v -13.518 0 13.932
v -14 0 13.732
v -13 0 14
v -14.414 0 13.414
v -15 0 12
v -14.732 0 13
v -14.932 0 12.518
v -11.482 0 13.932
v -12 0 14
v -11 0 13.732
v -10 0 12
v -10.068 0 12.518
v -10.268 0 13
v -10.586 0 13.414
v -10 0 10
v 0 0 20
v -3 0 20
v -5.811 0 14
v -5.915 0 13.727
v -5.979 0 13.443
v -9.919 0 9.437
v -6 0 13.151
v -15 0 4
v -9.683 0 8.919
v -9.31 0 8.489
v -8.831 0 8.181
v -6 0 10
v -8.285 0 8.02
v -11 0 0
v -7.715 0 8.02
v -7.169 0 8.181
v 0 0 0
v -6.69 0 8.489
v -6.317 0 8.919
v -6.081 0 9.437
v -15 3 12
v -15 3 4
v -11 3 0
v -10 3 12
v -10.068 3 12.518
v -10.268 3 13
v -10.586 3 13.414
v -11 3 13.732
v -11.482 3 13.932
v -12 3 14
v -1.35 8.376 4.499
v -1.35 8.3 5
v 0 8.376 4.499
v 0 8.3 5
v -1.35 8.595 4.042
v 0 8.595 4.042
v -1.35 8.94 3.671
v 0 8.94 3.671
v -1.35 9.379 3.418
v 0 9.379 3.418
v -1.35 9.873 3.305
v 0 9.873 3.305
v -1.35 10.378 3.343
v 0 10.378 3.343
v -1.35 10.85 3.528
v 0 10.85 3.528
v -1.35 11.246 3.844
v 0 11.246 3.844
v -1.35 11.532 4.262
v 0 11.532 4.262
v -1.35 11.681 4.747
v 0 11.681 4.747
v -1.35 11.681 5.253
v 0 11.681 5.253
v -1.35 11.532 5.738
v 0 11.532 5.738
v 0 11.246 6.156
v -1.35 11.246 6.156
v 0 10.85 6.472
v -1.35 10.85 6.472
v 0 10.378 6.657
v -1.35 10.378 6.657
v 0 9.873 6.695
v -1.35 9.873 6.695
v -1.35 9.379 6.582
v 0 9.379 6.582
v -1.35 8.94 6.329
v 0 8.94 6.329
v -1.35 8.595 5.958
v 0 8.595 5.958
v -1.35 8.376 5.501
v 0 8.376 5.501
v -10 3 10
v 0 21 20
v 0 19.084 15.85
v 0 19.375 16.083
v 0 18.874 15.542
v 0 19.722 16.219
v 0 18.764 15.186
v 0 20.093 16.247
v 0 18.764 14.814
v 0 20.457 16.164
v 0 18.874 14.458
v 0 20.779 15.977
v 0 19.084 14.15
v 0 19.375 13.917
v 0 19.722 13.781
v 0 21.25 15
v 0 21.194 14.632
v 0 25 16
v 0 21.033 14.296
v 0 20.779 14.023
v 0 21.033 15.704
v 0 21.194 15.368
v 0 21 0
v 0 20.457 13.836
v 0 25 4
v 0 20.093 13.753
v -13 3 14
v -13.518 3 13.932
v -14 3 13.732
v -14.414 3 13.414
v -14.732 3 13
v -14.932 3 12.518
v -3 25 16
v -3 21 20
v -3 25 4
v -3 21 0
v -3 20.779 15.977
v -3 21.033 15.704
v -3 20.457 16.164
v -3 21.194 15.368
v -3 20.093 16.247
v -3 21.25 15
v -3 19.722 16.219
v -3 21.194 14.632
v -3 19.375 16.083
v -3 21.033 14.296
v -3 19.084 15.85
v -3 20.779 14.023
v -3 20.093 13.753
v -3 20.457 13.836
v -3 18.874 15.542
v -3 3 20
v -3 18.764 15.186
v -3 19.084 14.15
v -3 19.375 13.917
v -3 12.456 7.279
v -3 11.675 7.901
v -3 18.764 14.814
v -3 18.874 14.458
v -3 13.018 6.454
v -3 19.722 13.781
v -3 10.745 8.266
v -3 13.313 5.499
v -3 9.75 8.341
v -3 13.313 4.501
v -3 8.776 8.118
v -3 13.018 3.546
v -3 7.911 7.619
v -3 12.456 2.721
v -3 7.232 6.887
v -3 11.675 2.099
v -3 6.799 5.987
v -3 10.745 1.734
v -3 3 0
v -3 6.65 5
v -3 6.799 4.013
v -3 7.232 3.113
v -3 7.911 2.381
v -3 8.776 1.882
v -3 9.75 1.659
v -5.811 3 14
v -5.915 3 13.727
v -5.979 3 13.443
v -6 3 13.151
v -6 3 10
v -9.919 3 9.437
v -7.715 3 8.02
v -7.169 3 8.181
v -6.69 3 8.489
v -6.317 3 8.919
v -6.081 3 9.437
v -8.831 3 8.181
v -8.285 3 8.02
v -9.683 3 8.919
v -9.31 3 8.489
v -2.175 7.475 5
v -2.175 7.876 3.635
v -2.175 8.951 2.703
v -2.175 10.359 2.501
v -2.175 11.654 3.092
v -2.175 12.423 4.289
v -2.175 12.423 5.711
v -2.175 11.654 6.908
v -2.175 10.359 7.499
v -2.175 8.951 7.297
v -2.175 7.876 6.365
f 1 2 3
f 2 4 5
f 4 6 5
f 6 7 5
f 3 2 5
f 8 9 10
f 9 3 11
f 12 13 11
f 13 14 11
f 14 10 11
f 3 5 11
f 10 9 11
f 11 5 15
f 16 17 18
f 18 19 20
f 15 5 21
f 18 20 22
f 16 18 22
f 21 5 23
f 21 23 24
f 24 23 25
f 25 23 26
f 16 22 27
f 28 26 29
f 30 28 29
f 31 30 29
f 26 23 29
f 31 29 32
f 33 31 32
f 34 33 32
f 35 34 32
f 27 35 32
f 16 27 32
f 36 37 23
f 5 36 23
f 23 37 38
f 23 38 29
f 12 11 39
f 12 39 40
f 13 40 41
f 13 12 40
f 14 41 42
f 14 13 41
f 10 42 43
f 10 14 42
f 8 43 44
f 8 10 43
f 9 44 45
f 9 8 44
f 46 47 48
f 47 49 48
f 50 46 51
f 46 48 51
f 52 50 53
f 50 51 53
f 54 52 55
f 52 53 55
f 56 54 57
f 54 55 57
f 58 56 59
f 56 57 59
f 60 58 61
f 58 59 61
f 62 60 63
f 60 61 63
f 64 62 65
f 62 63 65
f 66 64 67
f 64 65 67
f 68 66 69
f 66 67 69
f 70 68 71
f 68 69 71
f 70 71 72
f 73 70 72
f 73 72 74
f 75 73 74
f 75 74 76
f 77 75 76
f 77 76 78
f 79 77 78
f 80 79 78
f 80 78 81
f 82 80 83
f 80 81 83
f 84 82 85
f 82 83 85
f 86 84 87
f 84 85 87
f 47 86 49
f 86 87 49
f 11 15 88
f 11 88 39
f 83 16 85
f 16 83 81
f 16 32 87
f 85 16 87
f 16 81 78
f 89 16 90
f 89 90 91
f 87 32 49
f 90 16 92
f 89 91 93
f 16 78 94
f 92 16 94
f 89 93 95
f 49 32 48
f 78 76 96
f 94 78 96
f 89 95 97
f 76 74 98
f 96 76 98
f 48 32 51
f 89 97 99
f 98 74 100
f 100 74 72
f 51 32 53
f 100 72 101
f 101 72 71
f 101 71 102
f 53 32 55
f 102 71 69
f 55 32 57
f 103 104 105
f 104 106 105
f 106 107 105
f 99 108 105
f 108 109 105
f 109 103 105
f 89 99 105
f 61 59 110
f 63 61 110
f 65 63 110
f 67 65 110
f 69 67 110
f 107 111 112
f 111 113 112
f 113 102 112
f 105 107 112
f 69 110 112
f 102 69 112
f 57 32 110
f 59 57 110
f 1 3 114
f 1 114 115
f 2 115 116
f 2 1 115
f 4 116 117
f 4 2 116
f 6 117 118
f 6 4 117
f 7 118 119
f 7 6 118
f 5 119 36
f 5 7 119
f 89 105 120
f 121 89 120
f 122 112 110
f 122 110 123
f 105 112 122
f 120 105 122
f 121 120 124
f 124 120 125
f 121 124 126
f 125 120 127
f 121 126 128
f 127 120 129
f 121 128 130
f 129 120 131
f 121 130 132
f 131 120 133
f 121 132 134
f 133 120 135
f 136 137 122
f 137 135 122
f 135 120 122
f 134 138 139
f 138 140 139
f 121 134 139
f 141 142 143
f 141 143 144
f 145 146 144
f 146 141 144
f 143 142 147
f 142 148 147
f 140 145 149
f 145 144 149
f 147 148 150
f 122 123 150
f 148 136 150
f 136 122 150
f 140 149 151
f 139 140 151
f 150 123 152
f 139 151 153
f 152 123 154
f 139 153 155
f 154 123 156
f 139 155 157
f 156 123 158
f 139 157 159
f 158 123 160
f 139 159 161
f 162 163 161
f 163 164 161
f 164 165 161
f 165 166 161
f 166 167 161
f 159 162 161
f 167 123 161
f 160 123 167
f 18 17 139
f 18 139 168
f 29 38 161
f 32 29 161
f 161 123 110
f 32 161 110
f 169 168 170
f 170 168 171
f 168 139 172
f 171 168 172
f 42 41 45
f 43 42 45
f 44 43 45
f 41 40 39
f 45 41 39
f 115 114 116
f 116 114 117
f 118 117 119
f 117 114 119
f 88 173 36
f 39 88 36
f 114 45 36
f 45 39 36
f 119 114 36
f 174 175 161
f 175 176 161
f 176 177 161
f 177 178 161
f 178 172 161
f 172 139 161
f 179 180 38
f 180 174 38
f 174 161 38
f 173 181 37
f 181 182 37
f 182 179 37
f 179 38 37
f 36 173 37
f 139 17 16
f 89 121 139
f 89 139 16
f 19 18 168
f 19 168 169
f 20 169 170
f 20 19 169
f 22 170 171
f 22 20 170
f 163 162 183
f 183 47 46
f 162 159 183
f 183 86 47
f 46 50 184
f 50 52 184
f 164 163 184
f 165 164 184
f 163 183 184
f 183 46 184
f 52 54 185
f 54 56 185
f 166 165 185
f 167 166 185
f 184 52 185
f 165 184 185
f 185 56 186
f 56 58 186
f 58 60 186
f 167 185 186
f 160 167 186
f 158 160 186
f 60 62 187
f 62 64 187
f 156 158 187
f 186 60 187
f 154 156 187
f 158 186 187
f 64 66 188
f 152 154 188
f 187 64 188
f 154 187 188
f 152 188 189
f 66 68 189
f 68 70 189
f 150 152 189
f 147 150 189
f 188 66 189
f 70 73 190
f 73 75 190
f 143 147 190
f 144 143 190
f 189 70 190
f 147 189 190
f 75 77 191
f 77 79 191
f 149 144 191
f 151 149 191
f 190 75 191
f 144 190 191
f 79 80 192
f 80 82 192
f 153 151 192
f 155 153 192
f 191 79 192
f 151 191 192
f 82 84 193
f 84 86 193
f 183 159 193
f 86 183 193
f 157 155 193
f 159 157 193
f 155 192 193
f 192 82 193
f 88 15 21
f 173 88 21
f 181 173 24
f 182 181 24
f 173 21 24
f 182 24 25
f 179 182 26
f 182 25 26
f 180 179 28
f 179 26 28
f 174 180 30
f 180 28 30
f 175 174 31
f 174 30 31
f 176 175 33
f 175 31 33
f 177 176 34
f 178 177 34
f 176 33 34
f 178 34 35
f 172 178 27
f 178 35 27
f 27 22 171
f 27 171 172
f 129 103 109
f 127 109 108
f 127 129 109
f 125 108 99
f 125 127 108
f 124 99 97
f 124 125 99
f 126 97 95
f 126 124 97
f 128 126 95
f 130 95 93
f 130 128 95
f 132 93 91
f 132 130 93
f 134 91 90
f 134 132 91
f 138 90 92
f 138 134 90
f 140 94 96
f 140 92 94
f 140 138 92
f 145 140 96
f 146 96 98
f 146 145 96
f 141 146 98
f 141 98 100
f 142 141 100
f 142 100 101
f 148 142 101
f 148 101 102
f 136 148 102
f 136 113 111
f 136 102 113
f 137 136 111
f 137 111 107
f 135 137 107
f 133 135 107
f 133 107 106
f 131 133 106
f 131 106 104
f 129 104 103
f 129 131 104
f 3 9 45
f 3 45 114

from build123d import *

# Parameters (mm, degrees)
PAD_DEPTH        = 20
POCKET_DEPTH     = 25.001
HOLE_D           = 3.4
HOLE_DEPTH       = 25
HOLE_CSINK_D     = 6.7
HOLE_CSINK_ANGLE = 90
SKETCH029_R      = 1.25
HOLE002_DEPTH    = 3.001
CHAMFER003_SIZE  = 4


with BuildPart() as part:
    # Sketch → Pad (new body)
    with BuildSketch(Plane.XY):
        Polygon((0, 0), (0, 25), (-3, 25), (-3, 3), (-15, 3), (-15, 0), align=None)
    extrude(amount=PAD_DEPTH)

    # Sketch027 → Pocket (cut, through all)
    with BuildSketch(Plane.XZ):
        with BuildLine():
            Line((-3, 20), (-5.811082, 14))
            ThreePointArc((-5.811082, 14), (-5.952199, 13.58613), (-6, 13.151483))
            Line((-6, 13.151483), (-6, 10))
            ThreePointArc((-10, 10), (-8, 8), (-6, 10))
            Line((-10, 10), (-10, 12))
            ThreePointArc((-10, 12), (-10.585786, 13.414214), (-12, 14))
            Line((-12, 14), (-13, 14))
            ThreePointArc((-13, 14), (-14.414214, 13.414214), (-15, 12))
            Line((-15, 12), (-15, 20))
            Line((-15, 20), (-3, 20))
        make_face()
    extrude(amount=-POCKET_DEPTH, mode=Mode.SUBTRACT)

    # Hole
    with Locations(Plane(origin=(-3, 0, 0), x_dir=(0, 1, 0), z_dir=(-1, 0, 0))):
        with Locations((10, -5)):
            CounterSinkHole(HOLE_D / 2, HOLE_CSINK_D / 2, depth=HOLE_DEPTH, counter_sink_angle=HOLE_CSINK_ANGLE)

    # Sketch029 → Hole002 (cut, through all)
    with BuildSketch(Plane.YZ.offset(-3)):
        with Locations((20, 15)):
            Circle(SKETCH029_R)
    extrude(amount=HOLE002_DEPTH, mode=Mode.SUBTRACT)

    # Chamfer003
    chamfer003_edges = [part.edges().sort_by_distance(p)[0] for p in [
        (-15, 1.5, 0),
        (-1.5, 25, 0),
        (-1.5, 25, 20),
    ]]
    chamfer(chamfer003_edges, length=CHAMFER003_SIZE)


solid = part.part
